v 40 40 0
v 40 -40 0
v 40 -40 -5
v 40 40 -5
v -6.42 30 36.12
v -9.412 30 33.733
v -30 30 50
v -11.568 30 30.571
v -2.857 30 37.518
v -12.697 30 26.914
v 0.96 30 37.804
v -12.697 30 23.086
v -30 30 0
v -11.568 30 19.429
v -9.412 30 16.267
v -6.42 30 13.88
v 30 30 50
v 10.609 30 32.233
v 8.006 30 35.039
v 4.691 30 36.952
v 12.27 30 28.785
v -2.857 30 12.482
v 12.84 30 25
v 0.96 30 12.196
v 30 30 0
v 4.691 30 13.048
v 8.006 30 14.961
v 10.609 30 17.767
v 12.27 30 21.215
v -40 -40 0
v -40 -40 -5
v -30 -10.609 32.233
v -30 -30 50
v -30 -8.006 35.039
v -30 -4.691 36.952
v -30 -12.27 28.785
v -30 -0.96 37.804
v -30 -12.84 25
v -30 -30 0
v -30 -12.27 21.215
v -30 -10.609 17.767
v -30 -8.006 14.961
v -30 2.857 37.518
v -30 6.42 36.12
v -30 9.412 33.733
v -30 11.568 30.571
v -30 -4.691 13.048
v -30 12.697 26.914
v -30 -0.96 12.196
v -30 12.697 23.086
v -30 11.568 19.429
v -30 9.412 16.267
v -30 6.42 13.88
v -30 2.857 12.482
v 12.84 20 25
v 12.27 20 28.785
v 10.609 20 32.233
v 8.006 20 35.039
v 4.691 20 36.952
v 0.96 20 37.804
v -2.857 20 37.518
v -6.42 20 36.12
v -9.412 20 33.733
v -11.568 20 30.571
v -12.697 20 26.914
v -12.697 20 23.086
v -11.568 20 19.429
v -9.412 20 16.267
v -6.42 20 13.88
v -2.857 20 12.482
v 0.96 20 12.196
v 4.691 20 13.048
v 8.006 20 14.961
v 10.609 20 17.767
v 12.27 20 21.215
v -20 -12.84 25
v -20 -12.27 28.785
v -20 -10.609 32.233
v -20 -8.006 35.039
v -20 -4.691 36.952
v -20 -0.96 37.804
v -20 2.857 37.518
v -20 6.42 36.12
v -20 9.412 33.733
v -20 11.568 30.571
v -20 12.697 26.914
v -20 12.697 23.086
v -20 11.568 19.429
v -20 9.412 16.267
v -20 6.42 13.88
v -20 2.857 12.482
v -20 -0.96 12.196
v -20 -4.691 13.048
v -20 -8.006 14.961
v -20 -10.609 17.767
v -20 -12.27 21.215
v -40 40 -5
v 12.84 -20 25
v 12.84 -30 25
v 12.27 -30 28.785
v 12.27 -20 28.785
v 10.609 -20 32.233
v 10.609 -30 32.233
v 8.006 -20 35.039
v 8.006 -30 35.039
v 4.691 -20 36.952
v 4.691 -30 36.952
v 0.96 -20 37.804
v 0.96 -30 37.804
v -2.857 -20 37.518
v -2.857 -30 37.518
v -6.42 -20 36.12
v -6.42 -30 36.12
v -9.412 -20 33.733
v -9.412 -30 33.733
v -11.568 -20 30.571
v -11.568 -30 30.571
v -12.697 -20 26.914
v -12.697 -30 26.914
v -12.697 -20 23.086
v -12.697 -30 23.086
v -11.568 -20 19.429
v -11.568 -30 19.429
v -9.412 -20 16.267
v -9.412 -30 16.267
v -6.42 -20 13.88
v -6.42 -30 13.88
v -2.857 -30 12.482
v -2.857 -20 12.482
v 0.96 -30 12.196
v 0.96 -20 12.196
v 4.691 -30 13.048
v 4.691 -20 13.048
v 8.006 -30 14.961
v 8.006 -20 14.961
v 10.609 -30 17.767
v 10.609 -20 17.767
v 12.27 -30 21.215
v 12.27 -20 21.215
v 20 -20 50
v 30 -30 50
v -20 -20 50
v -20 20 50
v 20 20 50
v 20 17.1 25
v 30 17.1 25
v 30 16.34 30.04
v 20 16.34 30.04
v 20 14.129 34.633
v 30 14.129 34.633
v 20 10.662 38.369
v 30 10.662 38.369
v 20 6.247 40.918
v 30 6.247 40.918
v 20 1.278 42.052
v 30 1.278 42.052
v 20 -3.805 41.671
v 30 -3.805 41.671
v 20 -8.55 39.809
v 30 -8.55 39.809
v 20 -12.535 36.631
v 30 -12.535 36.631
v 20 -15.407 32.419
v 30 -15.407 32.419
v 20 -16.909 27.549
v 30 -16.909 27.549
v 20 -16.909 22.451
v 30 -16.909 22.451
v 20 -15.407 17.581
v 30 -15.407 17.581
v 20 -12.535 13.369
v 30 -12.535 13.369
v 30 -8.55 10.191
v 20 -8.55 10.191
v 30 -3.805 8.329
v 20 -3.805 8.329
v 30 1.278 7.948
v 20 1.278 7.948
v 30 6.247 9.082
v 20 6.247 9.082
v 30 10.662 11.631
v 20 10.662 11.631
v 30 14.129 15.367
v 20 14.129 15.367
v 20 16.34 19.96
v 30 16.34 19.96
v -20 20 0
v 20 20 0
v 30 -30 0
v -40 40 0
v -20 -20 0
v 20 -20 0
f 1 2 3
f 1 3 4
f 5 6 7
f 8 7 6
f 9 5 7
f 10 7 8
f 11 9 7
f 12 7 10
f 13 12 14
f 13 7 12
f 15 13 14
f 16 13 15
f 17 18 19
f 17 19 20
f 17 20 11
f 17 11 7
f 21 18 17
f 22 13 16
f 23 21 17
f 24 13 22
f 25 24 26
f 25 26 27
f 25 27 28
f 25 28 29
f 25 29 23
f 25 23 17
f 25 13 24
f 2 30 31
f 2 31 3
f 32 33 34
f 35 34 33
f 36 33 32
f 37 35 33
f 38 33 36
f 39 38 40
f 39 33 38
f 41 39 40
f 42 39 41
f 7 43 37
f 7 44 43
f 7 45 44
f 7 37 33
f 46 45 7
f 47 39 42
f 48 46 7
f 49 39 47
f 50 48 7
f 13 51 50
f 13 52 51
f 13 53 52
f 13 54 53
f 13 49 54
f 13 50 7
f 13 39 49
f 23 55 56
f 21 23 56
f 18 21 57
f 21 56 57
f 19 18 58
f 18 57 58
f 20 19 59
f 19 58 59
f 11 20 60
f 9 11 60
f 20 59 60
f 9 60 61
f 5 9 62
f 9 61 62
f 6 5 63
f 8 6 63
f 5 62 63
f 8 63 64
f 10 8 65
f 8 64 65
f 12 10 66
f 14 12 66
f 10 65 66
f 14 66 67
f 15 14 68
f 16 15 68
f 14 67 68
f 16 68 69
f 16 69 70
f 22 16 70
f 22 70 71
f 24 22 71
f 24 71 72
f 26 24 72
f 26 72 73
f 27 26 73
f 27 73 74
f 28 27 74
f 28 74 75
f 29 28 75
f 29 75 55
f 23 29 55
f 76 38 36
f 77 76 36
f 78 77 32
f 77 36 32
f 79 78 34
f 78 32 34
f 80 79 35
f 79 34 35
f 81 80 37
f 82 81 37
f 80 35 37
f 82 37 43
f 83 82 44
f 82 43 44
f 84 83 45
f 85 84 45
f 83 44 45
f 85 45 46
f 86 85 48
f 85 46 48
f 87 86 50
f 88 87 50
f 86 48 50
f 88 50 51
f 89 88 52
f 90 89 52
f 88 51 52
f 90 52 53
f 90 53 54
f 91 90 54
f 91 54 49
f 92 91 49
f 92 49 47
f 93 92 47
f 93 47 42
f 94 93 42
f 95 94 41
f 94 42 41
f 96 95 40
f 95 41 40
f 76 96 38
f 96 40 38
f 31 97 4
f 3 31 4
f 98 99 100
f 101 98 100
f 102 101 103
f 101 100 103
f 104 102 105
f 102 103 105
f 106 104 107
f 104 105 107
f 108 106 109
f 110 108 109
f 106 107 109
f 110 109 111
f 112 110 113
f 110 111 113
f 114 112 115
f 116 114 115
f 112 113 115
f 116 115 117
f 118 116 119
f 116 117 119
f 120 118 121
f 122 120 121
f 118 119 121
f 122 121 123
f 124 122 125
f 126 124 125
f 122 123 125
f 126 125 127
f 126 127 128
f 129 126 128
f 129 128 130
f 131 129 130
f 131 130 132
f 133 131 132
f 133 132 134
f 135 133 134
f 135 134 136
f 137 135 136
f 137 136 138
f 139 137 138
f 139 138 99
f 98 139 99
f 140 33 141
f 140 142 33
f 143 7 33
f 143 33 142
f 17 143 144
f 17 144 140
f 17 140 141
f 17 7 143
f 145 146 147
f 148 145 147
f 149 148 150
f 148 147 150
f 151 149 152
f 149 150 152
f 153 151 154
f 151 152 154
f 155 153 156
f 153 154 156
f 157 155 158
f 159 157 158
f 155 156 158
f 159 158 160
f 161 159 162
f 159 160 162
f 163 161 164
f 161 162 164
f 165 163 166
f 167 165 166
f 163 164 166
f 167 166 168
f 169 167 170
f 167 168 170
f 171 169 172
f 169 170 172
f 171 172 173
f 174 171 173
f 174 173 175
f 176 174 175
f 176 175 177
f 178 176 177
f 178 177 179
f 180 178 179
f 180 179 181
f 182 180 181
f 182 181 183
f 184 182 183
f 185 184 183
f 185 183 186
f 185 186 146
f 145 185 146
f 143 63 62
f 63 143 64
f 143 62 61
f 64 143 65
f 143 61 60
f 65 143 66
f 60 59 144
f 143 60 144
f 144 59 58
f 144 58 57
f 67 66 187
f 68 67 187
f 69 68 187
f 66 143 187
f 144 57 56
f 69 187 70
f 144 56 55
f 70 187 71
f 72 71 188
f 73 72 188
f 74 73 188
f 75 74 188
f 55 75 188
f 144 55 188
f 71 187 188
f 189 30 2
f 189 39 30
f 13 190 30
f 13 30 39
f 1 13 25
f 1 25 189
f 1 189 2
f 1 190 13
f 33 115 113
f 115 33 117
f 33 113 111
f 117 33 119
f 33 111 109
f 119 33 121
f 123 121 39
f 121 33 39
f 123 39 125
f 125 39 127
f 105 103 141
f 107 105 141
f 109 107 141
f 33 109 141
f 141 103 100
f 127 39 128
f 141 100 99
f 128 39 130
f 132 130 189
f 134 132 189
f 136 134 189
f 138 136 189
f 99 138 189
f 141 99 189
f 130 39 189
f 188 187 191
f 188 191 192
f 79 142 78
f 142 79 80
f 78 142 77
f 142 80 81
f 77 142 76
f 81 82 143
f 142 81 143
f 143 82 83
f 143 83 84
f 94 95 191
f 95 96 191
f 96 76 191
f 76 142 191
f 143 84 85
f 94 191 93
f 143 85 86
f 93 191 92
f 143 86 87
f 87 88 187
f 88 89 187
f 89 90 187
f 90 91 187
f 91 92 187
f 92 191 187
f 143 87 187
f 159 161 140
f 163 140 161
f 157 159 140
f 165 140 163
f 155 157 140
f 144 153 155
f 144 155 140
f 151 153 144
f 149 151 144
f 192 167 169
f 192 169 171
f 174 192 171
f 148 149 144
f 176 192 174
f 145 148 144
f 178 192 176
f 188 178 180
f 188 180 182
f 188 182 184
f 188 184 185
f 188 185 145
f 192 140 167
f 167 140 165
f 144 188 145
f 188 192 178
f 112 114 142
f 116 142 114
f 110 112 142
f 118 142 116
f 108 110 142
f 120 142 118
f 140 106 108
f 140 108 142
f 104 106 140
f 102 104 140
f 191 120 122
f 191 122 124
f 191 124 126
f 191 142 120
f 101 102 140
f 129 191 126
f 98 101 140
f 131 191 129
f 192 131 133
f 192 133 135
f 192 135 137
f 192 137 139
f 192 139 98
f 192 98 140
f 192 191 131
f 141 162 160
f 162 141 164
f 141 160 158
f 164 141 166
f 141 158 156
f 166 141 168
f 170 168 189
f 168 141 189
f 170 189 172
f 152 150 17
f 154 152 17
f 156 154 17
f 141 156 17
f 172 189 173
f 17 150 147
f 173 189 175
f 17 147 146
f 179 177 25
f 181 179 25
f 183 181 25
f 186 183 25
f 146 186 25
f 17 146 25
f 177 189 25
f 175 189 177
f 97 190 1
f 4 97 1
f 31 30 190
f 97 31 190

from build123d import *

# Parameters (mm, degrees)
F0_W      = 60
F0_H      = 60
F2_DEPTH  = 50
F1_W      = 40
F1_H      = 40
F3_DEPTH  = 50
F4_R      = 12.84
F5_DEPTH  = 60
F6_R      = 12.84
F7_DEPTH  = 10
F8_R      = 17.1
F9_DEPTH  = 25
F10_W     = 80
F10_H     = 80
F11_DEPTH = 5


with BuildPart() as f2:
    # F0 (on Top) → F2 (new body)
    with BuildSketch(Plane.XY):
        Rectangle(F0_W, F0_H)
    extrude(amount=F2_DEPTH)

    # F1 (on Top) → F3 (cut)
    with BuildSketch(Plane.XY):
        Rectangle(F1_W, F1_H)
    extrude(amount=F3_DEPTH, mode=Mode.SUBTRACT)

    # F4 (on face) → F5 (cut)
    with BuildSketch(Plane.XZ.offset(30)):
        with Locations((0, 25)):
            Circle(F4_R)
    extrude(amount=-F5_DEPTH, mode=Mode.SUBTRACT)

    # F6 (on face) → F7 (cut)
    with BuildSketch(Plane(origin=(-30, 0, 0), x_dir=(0, -1, 0), z_dir=(-1, 0, 0))):
        with Locations((0, 25)):
            Circle(F6_R)
    extrude(amount=-F7_DEPTH, mode=Mode.SUBTRACT)

    # F8 (on face) → F9 (cut)
    with BuildSketch(Plane.YZ.offset(30)):
        with Locations((0, 25)):
            Circle(F8_R)
    extrude(amount=-F9_DEPTH, mode=Mode.SUBTRACT)

    # F10 (on Top) → F11 (join)
    with BuildSketch(Plane.XY):
        Rectangle(F10_W, F10_H)
    extrude(amount=-F11_DEPTH)


solid = f2.part
